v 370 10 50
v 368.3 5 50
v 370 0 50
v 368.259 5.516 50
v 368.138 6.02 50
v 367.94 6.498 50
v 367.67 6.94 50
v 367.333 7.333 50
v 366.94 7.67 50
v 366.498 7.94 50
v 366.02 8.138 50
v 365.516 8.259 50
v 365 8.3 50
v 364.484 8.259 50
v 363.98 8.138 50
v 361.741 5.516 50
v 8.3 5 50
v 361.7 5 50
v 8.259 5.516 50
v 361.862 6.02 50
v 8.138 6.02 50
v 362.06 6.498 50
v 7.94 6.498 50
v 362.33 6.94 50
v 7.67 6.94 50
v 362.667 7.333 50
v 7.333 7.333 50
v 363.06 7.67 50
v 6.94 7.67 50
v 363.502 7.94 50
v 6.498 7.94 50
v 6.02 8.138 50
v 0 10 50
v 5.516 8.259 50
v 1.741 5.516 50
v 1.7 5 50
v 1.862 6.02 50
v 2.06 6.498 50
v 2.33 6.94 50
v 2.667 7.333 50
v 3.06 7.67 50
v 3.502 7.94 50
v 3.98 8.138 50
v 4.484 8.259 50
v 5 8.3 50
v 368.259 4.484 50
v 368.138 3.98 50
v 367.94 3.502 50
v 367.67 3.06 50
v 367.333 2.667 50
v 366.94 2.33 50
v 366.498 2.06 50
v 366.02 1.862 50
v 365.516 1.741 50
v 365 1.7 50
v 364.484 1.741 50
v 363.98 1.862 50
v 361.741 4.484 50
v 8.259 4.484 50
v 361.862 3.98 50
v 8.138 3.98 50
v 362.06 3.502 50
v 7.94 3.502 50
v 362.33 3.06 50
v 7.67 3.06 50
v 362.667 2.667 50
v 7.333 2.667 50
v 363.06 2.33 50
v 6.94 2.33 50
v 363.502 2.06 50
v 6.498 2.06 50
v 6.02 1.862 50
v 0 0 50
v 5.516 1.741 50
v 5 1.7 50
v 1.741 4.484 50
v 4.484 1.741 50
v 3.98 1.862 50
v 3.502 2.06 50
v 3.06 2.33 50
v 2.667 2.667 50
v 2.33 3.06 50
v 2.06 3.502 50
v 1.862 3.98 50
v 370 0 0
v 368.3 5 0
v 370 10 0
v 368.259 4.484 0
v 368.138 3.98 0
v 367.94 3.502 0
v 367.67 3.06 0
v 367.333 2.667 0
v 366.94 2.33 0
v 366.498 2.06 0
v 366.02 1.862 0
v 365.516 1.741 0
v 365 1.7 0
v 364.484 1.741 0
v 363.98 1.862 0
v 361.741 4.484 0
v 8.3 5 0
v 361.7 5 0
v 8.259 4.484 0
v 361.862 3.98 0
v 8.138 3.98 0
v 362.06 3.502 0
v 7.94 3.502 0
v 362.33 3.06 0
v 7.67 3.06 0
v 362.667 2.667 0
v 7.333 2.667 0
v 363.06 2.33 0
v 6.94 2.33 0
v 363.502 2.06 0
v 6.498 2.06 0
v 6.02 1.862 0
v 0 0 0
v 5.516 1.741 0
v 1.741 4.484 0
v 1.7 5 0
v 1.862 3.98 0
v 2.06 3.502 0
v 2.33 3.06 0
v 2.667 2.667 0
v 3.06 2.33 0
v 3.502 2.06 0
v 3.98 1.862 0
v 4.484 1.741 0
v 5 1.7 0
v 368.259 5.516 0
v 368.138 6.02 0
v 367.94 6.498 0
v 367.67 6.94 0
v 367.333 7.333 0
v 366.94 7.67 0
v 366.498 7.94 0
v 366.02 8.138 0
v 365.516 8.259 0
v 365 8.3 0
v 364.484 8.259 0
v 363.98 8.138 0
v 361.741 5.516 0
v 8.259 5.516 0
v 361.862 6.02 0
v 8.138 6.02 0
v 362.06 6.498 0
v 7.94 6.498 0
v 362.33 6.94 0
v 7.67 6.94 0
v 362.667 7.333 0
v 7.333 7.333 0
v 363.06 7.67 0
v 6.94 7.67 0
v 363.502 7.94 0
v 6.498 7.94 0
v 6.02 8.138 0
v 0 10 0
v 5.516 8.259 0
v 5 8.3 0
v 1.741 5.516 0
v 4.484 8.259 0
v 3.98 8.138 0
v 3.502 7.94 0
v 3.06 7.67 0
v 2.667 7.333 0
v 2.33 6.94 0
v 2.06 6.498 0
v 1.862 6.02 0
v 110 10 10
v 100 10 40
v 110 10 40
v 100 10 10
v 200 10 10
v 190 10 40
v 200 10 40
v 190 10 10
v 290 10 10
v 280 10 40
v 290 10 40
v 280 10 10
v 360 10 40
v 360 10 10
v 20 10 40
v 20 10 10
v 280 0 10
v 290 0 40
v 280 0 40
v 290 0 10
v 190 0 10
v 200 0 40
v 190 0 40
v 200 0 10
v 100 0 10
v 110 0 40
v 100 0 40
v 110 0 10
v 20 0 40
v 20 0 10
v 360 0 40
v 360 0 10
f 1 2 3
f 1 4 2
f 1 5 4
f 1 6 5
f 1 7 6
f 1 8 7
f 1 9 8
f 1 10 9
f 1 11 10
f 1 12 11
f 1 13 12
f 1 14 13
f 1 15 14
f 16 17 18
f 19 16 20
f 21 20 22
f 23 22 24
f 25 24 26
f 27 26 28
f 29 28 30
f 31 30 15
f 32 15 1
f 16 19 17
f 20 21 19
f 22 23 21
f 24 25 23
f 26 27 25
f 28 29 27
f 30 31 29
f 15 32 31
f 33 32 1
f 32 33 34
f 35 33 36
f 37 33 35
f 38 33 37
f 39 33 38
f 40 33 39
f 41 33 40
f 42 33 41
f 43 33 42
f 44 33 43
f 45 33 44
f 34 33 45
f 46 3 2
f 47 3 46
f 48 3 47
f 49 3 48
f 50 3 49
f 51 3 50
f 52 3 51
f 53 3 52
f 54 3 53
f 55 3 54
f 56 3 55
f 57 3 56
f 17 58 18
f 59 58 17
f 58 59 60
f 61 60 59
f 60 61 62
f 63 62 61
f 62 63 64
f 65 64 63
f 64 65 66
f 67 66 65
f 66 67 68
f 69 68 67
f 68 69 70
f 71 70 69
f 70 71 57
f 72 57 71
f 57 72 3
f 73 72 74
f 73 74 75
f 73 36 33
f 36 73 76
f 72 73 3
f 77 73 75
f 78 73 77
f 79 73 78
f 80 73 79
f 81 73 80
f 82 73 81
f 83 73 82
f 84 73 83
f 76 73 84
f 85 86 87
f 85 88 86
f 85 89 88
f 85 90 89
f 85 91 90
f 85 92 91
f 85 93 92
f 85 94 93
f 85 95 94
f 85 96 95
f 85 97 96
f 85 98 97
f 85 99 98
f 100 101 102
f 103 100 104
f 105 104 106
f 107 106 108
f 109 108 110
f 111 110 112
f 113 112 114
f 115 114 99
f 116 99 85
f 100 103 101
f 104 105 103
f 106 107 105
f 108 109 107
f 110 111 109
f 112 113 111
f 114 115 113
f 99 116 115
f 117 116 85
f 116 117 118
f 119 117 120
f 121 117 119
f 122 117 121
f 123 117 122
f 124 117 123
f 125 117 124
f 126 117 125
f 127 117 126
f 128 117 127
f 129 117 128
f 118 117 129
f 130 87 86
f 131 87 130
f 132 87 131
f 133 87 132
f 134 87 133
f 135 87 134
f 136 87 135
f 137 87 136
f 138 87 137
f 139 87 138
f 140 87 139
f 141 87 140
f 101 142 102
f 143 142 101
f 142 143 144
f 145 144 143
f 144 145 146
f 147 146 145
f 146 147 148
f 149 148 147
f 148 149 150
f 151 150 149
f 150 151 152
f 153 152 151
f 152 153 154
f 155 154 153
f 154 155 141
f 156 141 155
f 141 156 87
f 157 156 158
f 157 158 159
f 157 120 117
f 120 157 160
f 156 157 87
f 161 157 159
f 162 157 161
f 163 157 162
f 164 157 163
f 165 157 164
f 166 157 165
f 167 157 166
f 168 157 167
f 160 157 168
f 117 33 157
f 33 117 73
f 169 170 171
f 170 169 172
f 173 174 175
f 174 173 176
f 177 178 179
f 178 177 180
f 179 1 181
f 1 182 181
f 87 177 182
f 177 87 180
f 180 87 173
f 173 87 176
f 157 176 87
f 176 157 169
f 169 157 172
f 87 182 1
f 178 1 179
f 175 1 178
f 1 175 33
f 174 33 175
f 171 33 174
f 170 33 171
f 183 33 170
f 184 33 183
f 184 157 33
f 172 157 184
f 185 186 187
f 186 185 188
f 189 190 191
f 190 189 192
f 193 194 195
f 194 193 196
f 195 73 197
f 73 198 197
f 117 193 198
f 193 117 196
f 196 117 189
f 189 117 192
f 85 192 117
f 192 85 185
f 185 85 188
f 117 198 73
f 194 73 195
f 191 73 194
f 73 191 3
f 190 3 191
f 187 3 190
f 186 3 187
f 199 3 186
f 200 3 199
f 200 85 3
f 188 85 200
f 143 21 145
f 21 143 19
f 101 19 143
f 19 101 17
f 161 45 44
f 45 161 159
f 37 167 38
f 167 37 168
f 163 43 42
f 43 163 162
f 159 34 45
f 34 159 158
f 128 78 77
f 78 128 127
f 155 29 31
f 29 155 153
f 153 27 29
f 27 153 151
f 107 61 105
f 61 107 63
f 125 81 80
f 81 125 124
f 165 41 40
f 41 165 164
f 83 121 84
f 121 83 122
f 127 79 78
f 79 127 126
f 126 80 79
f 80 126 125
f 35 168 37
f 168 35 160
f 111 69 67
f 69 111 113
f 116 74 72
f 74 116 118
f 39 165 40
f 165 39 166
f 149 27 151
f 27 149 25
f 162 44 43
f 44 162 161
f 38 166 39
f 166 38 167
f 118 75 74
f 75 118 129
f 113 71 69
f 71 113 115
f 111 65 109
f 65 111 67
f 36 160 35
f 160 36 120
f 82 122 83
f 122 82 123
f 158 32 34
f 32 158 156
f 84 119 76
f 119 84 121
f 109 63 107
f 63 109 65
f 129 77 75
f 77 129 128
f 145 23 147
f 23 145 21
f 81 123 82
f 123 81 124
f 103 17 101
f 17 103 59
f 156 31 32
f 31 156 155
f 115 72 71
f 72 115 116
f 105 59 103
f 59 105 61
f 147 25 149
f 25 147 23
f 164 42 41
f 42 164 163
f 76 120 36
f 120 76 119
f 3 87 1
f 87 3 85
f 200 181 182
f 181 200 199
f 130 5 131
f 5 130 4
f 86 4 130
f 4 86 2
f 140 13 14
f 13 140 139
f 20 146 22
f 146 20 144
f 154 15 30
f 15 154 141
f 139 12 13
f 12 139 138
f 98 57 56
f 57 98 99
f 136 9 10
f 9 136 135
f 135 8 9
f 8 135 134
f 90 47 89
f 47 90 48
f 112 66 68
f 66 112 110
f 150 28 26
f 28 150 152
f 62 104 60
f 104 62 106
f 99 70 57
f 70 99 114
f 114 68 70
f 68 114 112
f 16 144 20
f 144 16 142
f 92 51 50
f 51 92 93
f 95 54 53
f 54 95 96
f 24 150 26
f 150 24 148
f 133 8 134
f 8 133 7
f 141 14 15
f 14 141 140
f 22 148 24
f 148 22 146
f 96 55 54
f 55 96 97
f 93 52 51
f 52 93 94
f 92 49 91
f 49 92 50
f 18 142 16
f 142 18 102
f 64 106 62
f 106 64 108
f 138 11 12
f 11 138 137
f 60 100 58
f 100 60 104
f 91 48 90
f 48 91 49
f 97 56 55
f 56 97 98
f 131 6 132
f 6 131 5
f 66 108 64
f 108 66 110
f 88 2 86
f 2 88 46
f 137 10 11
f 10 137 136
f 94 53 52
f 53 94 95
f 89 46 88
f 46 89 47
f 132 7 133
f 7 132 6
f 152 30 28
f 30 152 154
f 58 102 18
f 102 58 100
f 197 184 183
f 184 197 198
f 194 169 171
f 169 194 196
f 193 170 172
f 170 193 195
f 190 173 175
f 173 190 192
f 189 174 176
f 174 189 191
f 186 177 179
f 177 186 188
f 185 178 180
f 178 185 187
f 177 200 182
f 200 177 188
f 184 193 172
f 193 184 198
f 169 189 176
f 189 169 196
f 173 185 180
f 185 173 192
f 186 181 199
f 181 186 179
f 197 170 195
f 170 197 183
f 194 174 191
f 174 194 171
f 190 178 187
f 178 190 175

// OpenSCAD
// cage_side_ypos.scad
// Generates one 50mm-tall side band for the +Y wall.
bar = 10;
inner = 350;
segH = 50;
holeD = 6.6;
gap = 80;
outer = inner + 2 * bar;

module corner_block()
{
  difference()
  {
    cube([bar, bar, segH], center = false);
    translate([bar / 2, bar / 2, 0]) cylinder(d = holeD, h = segH, $fn = 40);
  }
}

module side_band_y()
{
  // Local coords:
  // Y thickness is bar
  // X runs along wall length (0..outer)
  union()
  {
    translate([0, 0, 0]) corner_block();
    translate([outer -bar, 0, 0]) corner_block(); // horizontals along X
    translate([bar, 0, 0]) cube([outer -2 * bar, bar, bar], center = false);
    translate([bar, 0, segH -bar]) cube([outer -2 * bar, bar, bar], center = false); // vertical bars along X
    x0 = bar;
    maxX = outer -bar;
    L = inner;
    n = floor((L + gap) / (bar + gap));
    for(k = [0:n])
    {
      x = x0 + k * (bar + gap);
      if(x + bar <= maxX + 1e-6)
      {
        translate([x, 0, 0]) cube([bar, bar, segH], center = false);
      }
    }
  }
}

side_band_y();
